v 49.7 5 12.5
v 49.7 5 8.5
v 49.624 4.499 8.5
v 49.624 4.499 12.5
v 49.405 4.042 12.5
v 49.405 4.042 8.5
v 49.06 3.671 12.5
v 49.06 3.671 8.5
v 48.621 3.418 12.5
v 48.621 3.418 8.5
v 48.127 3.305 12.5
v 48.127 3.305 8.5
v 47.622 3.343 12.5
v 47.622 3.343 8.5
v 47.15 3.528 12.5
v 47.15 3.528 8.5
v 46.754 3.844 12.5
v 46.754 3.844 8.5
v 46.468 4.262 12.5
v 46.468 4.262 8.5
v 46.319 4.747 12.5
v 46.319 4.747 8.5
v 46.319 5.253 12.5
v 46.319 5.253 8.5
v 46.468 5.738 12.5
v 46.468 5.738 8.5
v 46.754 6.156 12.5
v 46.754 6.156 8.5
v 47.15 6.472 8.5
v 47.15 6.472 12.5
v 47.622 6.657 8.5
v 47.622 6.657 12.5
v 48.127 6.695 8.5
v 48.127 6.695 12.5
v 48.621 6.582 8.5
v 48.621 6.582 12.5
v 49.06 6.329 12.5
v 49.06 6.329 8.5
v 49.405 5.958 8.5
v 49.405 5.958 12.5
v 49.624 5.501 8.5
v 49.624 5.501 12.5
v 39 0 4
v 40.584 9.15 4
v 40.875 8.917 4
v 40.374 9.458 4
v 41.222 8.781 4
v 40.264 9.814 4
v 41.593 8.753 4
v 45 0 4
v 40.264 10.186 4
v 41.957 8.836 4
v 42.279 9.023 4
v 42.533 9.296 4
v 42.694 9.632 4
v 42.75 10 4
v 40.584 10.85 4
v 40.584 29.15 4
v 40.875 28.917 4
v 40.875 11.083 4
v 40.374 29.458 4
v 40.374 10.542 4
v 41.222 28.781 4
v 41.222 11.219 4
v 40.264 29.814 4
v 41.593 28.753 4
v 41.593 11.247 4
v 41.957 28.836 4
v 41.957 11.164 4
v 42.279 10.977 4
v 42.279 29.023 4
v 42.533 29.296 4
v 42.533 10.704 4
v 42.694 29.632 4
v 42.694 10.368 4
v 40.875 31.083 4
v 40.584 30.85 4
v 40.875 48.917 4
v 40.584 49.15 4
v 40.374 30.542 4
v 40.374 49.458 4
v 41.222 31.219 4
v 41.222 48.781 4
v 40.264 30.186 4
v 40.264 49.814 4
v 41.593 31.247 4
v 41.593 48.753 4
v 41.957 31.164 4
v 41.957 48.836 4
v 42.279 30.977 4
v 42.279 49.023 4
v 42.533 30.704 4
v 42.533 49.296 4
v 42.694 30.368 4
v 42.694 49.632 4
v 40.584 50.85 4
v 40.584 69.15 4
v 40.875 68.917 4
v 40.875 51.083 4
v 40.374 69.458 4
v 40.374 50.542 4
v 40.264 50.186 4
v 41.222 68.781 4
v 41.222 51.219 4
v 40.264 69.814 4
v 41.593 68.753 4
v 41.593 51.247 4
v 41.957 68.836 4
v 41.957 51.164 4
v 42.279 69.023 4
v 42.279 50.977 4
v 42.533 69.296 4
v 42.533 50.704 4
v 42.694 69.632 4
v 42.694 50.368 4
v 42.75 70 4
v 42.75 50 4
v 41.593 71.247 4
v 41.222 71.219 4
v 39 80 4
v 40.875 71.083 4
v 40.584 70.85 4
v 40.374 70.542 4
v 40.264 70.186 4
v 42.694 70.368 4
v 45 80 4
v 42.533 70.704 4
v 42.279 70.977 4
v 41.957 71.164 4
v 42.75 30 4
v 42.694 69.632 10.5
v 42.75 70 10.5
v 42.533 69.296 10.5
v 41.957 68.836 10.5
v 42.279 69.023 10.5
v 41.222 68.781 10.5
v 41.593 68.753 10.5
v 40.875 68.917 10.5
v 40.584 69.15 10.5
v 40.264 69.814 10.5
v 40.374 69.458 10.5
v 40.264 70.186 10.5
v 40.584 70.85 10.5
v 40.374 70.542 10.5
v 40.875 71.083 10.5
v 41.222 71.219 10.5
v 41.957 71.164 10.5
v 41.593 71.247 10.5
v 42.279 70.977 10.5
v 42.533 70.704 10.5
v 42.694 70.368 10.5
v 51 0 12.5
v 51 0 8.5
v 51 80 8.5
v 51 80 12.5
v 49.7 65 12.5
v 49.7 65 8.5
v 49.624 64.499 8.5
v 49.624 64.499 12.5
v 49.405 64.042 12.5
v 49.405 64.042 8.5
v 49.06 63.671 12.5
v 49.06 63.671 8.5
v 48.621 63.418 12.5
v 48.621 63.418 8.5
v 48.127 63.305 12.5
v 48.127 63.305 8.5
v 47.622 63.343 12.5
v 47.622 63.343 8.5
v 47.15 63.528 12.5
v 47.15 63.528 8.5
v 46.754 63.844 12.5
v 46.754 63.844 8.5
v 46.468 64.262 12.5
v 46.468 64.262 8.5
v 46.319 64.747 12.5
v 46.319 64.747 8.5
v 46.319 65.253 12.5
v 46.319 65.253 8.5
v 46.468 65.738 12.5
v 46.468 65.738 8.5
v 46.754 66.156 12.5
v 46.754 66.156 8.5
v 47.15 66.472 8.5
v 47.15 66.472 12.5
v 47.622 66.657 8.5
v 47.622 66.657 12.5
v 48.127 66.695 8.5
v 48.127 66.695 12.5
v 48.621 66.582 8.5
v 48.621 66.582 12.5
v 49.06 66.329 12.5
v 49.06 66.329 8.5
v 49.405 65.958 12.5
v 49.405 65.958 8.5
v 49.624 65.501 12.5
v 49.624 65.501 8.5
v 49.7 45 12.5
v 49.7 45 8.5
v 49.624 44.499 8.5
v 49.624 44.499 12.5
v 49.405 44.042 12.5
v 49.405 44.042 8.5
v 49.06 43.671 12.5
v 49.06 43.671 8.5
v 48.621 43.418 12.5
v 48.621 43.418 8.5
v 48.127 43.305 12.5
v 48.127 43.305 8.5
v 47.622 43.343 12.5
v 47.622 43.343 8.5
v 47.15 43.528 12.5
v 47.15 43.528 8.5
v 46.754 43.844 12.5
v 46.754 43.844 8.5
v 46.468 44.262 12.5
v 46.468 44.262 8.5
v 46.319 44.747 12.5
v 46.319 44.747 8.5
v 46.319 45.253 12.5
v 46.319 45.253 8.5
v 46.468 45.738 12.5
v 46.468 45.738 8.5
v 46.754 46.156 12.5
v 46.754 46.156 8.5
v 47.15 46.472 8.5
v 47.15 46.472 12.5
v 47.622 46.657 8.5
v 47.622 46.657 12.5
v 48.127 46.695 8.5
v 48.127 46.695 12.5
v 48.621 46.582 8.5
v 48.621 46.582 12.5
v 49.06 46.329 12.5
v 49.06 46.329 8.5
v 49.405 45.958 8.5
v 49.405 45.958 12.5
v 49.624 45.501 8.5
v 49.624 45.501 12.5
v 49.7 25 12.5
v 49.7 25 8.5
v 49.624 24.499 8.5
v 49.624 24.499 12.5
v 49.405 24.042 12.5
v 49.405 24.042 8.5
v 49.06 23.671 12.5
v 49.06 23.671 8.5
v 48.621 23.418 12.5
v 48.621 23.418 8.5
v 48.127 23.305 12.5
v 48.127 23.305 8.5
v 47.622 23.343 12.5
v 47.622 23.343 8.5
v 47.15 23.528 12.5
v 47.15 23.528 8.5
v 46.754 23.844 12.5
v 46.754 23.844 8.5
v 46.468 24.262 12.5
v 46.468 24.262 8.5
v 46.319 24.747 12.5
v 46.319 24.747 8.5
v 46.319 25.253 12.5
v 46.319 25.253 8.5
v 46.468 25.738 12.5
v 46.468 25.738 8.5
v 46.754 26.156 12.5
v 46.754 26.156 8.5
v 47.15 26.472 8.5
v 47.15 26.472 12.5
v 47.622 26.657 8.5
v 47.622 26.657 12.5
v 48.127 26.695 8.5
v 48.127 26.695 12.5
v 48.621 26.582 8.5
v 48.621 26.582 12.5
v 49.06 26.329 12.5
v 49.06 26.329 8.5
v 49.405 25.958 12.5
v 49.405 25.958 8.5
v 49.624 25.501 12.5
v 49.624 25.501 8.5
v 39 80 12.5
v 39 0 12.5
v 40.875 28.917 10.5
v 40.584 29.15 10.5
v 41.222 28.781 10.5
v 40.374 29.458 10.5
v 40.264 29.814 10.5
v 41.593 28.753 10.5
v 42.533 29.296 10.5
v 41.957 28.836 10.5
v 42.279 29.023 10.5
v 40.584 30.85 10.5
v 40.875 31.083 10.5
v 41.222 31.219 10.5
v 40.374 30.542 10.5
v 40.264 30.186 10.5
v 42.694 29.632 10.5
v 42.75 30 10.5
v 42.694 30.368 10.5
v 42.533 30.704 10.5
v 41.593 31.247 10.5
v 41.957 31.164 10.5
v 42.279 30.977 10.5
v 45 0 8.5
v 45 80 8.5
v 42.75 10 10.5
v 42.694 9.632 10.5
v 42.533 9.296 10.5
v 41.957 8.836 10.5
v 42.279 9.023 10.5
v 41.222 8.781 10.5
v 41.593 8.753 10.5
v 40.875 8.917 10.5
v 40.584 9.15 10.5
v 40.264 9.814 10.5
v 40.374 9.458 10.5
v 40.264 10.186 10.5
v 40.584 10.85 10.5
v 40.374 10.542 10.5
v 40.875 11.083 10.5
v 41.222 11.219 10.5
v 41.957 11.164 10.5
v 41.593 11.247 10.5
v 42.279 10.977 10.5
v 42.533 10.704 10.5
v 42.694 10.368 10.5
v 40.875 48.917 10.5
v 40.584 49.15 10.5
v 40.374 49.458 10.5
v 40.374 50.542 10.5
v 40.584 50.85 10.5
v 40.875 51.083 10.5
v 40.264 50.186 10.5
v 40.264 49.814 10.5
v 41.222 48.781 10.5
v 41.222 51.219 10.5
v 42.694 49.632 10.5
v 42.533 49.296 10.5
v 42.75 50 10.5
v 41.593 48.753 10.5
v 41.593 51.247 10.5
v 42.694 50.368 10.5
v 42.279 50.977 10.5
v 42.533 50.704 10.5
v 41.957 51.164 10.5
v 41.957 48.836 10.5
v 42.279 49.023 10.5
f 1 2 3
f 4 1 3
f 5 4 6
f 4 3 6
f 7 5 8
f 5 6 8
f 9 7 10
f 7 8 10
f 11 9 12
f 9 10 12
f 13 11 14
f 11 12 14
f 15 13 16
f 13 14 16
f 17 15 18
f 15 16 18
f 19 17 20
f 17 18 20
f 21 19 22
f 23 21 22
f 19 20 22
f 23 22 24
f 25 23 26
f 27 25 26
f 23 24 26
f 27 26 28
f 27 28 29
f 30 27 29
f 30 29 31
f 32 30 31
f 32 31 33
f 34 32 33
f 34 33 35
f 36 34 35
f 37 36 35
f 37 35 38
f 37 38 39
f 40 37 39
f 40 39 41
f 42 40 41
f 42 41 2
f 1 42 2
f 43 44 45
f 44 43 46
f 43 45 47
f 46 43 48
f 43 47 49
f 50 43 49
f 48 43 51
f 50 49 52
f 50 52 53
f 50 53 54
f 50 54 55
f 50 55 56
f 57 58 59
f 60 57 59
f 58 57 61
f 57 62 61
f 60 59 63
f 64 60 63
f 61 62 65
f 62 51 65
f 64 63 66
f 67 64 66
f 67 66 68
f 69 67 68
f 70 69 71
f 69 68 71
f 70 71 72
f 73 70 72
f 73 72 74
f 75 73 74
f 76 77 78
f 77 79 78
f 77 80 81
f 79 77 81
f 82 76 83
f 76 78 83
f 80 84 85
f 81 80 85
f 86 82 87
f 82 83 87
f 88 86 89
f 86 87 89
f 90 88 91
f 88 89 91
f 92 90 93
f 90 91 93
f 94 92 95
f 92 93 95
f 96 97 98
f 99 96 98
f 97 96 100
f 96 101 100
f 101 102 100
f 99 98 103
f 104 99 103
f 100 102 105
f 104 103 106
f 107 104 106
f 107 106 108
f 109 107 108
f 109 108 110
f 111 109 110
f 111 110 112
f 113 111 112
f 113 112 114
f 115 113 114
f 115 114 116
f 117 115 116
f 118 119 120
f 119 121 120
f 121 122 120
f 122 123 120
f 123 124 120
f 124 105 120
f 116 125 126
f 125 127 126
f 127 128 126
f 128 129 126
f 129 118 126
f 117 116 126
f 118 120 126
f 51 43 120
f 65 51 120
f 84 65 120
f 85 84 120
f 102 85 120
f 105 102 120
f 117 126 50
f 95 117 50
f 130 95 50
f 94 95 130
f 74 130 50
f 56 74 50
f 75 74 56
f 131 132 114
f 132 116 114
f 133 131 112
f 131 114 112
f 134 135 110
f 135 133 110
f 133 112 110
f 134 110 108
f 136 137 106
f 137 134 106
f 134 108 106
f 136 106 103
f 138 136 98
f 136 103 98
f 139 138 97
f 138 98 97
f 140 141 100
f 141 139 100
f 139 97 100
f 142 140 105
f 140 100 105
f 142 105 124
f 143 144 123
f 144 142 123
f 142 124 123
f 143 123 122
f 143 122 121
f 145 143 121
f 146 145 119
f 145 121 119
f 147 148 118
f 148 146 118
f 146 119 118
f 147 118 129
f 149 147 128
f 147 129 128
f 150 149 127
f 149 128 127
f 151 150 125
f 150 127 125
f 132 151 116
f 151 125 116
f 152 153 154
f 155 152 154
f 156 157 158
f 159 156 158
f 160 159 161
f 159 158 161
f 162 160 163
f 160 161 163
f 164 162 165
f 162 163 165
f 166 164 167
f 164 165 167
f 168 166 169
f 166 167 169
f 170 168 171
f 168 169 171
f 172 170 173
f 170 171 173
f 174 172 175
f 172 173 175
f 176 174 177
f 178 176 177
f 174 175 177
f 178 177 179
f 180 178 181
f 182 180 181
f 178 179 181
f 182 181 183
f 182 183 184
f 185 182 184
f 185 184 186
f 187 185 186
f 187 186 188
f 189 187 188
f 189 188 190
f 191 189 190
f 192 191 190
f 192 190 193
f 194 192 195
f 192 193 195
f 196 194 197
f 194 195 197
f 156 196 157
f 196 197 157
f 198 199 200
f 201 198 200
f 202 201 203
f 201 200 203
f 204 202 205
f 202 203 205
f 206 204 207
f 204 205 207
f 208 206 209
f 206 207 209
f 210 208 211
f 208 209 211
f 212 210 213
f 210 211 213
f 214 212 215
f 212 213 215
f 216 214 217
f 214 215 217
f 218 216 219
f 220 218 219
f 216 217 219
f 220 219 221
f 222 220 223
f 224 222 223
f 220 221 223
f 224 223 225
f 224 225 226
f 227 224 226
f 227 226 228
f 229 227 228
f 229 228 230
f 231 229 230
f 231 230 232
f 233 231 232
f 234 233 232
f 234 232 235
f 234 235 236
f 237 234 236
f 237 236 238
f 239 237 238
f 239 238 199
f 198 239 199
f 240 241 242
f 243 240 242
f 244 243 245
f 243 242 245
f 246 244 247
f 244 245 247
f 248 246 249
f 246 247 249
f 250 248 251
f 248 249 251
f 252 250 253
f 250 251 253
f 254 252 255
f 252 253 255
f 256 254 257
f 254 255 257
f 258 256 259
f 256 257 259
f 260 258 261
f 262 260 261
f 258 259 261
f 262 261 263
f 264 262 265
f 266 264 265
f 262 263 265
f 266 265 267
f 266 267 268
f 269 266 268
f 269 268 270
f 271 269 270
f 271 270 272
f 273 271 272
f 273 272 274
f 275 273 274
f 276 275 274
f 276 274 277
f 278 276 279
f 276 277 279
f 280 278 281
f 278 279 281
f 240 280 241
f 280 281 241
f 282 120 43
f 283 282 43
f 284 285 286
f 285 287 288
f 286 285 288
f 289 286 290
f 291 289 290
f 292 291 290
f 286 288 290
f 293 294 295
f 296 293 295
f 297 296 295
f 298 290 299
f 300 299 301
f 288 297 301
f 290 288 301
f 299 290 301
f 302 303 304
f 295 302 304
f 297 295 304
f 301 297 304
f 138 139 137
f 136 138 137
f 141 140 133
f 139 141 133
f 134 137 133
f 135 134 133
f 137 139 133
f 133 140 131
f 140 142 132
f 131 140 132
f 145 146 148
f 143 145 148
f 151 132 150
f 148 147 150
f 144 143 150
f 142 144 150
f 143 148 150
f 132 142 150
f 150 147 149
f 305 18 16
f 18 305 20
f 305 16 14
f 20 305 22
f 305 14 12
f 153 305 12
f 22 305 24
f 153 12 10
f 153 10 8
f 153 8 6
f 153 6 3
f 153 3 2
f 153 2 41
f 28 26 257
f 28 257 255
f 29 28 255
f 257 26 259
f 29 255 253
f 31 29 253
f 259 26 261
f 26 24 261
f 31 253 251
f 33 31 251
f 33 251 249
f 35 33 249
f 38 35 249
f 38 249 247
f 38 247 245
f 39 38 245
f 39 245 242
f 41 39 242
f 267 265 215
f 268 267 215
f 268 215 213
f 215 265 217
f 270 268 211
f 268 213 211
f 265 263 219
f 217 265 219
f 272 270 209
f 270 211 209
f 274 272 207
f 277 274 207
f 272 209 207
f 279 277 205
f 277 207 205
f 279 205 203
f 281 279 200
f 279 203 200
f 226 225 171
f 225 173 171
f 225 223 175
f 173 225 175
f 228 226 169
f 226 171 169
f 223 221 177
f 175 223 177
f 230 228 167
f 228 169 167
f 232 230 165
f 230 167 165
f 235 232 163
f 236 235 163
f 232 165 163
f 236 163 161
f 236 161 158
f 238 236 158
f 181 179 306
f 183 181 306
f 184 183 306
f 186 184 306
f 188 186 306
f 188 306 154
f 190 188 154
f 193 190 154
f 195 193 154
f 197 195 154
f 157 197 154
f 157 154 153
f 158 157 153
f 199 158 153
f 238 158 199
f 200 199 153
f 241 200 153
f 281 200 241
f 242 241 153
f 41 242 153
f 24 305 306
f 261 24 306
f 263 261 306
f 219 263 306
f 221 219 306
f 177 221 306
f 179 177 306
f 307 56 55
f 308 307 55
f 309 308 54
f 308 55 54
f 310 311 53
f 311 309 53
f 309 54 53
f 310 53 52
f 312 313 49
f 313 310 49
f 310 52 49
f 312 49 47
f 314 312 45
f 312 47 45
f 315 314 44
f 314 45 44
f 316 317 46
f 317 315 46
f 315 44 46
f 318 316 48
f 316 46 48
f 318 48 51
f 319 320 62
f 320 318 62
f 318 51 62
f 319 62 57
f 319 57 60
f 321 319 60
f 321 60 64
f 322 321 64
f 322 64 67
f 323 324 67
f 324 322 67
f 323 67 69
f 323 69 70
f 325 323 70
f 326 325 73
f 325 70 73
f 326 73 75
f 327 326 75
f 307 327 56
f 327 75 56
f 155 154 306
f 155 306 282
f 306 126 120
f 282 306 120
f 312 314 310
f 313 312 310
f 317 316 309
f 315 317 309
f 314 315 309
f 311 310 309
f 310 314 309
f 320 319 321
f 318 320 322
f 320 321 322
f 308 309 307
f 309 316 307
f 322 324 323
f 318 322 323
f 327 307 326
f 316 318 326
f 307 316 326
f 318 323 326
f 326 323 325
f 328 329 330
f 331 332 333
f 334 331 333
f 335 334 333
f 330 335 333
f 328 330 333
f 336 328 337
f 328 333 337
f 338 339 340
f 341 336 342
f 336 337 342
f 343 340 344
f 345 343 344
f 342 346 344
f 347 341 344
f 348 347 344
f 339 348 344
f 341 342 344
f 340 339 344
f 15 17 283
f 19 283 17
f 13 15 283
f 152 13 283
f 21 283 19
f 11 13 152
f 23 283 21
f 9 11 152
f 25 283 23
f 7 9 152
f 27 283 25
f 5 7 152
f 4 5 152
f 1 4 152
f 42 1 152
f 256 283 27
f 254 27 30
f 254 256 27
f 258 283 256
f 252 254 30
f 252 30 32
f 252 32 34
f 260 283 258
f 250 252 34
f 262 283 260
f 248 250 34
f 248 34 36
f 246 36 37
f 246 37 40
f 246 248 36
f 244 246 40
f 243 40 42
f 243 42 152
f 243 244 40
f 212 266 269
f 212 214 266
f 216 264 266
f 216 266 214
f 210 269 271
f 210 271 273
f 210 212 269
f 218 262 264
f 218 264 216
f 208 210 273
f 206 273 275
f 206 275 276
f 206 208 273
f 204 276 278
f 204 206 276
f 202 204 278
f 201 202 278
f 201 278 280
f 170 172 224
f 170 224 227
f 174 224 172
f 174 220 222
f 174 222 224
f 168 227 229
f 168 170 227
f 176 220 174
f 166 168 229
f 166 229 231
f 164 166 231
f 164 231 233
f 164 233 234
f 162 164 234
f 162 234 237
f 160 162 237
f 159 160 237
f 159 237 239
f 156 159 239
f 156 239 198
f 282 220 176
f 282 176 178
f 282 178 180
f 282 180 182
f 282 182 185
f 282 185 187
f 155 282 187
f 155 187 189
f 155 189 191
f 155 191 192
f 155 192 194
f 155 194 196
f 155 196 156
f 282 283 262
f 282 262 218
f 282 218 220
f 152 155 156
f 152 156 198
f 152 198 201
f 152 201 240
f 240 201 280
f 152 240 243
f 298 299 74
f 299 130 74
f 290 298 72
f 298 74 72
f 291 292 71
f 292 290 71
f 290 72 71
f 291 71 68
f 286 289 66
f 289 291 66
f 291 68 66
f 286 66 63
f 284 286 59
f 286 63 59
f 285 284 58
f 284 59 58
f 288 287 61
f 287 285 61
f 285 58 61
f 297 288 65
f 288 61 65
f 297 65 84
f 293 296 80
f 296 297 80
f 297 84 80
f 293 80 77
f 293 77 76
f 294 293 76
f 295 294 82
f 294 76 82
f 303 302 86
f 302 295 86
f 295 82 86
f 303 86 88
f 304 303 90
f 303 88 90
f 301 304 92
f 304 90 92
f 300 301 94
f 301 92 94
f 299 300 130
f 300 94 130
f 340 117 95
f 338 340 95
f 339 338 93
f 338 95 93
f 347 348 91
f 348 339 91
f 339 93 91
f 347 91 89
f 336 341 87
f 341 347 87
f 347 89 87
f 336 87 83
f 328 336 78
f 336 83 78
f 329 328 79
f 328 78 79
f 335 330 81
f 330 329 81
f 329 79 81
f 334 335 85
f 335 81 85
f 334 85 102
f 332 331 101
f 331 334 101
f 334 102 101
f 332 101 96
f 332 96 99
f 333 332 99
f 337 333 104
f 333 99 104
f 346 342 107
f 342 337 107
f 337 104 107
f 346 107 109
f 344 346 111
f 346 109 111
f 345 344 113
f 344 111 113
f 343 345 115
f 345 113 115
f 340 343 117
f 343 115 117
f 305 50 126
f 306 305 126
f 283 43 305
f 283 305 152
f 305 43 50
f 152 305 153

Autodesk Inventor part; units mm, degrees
ref_plane "Right_Connecting_Web_StartPlane" through (0, 0, 4) normal (0, 0, 1) x (1, 0, 0)
sketch "Right_Connecting_Web_Profile" plane through (0, 0, 4) normal (0, 0, 1) x (1, 0, 0)
  line L0 (39, 0) -> (45, 0)
  line L1 (45, 0) -> (45, 80)
  line L2 (45, 80) -> (39, 80)
  line L3 (39, 80) -> (39, 0)
  point P0 (0, 0)
  dimension "d1" = 39
  dimension "d2" = 6
  dimension "d3" = 80
extrude "Right_Connecting_Web" add sketch "Right_Connecting_Web_Profile" along normal blind 8.5
ref_plane "Right_Rod_Contact_Flange_StartPlane" through (0, 0, 8.5) normal (0, 0, 1) x (1, 0, 0)
sketch "Right_Rod_Contact_Flange_Profile" plane through (0, 0, 8.5) normal (0, 0, 1) x (1, 0, 0)
  line L0 (39, 0) -> (51, 0)
  line L1 (51, 0) -> (51, 80)
  line L2 (51, 80) -> (39, 80)
  line L3 (39, 80) -> (39, 0)
  point P0 (0, 0)
  dimension "d7" = 39
  dimension "d8" = 12
  dimension "d9" = 80
extrude "Right_Rod_Contact_Flange" add sketch "Right_Rod_Contact_Flange_Profile" along normal blind 4
sketch "Original_Rod_Clearance_4x_Locations" plane through (0, 0, 0) normal (0, 0, 1) x (1, 0, 0)
  circle A0 centre (48, 5) radius 1.7
  circle A1 centre (48, 25) radius 1.7
  circle A2 centre (48, 45) radius 1.7
  circle A3 centre (48, 65) radius 1.7
  point P0 (0, 0)
  dimension "d12" = 48
  dimension "d13" = 5
  dimension "d14" = 3.4
  dimension "d15" = 48
  dimension "d16" = 25
  dimension "d17" = 3.4
  dimension "d18" = 48
  dimension "d19" = 45
  dimension "d20" = 3.4
  dimension "d21" = 48
  dimension "d22" = 65
  dimension "d23" = 3.4
extrude "Original_Rod_Clearance_4x" cut sketch "Original_Rod_Clearance_4x_Locations" along normal through all
ref_plane "Work Plane3" through (0, 0, 4) normal (0, 0, 1) x (1, 0, 0)
sketch "Deck_Assembly_M3_Locations" plane through (0, 0, 4) normal (0, 0, 1) x (1, 0, 0)
  circle A0 centre (41.5, 10) radius 1.25
  circle A1 centre (41.5, 30) radius 1.25
  circle A2 centre (41.5, 50) radius 1.25
  circle A3 centre (41.5, 70) radius 1.25
  point P0 (0, 0)
  dimension "d27" = 41.5
  dimension "d28" = 10
  dimension "d29" = 2.5
  dimension "d30" = 41.5
  dimension "d31" = 30
  dimension "d32" = 2.5
  dimension "d33" = 41.5
  dimension "d34" = 50
  dimension "d35" = 2.5
  dimension "d36" = 41.5
  dimension "d37" = 70
  dimension "d38" = 2.5
extrude "Four_Blind_M3_Tap_Bores" cut sketch "Deck_Assembly_M3_Locations" along normal blind 6.5
thread "Deck_M3x0_5_6H_1" size "M3x0.5" class "6H" standard "ISO Metric profile" length 6.5
thread "Deck_M3x0_5_6H_2" size "M3x0.5" class "6H" standard "ISO Metric profile" length 6.5
thread "Deck_M3x0_5_6H_3" size "M3x0.5" class "6H" standard "ISO Metric profile" length 6.5
thread "Deck_M3x0_5_6H_4" size "M3x0.5" class "6H" standard "ISO Metric profile" length 6.5
equation "\"d1\" = -RodWidth + OverallWidth - WebThickness"
equation "\"d2\" = WebThickness"
equation "\"d3\" = ContactLength"
equation "\"d4\" = DropHeight"
equation "\"d7\" = -RodWidth + OverallWidth - WebThickness"
equation "\"d8\" = RodWidth + WebThickness"
equation "\"d9\" = ContactLength"
equation "\"d10\" = BaseThickness"
equation "\"d12\" = OverallWidth - 0.5 * RodWidth"
equation "\"d13\" = RodHoleStart + 0 * RodScrewPitch"
equation "\"d14\" = RodClearanceDiameter"
equation "\"d15\" = OverallWidth - 0.5 * RodWidth"
equation "\"d16\" = RodHoleStart + RodScrewPitch"
equation "\"d17\" = RodClearanceDiameter"
equation "\"d18\" = OverallWidth - 0.5 * RodWidth"
equation "\"d19\" = RodHoleStart + 2 * RodScrewPitch"
equation "\"d20\" = RodClearanceDiameter"
equation "\"d21\" = OverallWidth - 0.5 * RodWidth"
equation "\"d22\" = RodHoleStart + 3 * RodScrewPitch"
equation "\"d23\" = RodClearanceDiameter"
equation "\"d27\" = OverallWidth - JoinLeftX"
equation "\"d28\" = JoinFirstY + 0 * JoinPitch"
equation "\"d29\" = TapDrillDiameter"
equation "\"d30\" = OverallWidth - JoinLeftX"
equation "\"d31\" = JoinFirstY + JoinPitch"
equation "\"d32\" = TapDrillDiameter"
equation "\"d33\" = OverallWidth - JoinLeftX"
equation "\"d34\" = JoinFirstY + 2 * JoinPitch"
equation "\"d35\" = TapDrillDiameter"
equation "\"d36\" = OverallWidth - JoinLeftX"
equation "\"d37\" = JoinFirstY + 3 * JoinPitch"
equation "\"d38\" = TapDrillDiameter"
equation "\"d39\" = JoinThreadDepth"
equation "\"d41\" = JoinThreadDepth"
equation "\"d43\" = JoinThreadDepth"
equation "\"d45\" = JoinThreadDepth"
equation "\"d47\" = JoinThreadDepth"
equation "\"OverallWidth\" = 51"
equation "\"RodWidth\" = 6"
equation "\"ContactLength\" = 80"
equation "\"BaseThickness\" = 4"
equation "\"DropHeight\" = 8.5"
equation "\"WebThickness\" = 6"
equation "\"FingerStartX\" = 19.93338"
equation "\"FingerWidth\" = 13.5"
equation "\"FingerThickness\" = 6"
equation "\"FingerEndInset\" = 4"
equation "\"RodClearanceDiameter\" = 3.4"
equation "\"ClampFirstY\" = 41.82802"
equation "\"ClampPitch\" = 16"
equation "\"ClampHeight\" = BaseThickness + 0.5 * FingerThickness"
equation "\"TapDrillDiameter\" = 2.5"
equation "\"TapDepth\" = 6"
equation "\"RodHoleStart\" = 5"
equation "\"RodScrewPitch\" = 20"
equation "\"JoinLeftX\" = 9.5"
equation "\"JoinFirstY\" = 10"
equation "\"JoinPitch\" = 20"
equation "\"JoinThreadDepth\" = 6.5"
equation "\"JoinCountersinkDiameter\" = 6.2"
equation "\"d0\" = BaseThickness"
equation "\"d6\" = DropHeight"
equation "\"d26\" = BaseThickness"
properties part number "Right_Rod_Support"
